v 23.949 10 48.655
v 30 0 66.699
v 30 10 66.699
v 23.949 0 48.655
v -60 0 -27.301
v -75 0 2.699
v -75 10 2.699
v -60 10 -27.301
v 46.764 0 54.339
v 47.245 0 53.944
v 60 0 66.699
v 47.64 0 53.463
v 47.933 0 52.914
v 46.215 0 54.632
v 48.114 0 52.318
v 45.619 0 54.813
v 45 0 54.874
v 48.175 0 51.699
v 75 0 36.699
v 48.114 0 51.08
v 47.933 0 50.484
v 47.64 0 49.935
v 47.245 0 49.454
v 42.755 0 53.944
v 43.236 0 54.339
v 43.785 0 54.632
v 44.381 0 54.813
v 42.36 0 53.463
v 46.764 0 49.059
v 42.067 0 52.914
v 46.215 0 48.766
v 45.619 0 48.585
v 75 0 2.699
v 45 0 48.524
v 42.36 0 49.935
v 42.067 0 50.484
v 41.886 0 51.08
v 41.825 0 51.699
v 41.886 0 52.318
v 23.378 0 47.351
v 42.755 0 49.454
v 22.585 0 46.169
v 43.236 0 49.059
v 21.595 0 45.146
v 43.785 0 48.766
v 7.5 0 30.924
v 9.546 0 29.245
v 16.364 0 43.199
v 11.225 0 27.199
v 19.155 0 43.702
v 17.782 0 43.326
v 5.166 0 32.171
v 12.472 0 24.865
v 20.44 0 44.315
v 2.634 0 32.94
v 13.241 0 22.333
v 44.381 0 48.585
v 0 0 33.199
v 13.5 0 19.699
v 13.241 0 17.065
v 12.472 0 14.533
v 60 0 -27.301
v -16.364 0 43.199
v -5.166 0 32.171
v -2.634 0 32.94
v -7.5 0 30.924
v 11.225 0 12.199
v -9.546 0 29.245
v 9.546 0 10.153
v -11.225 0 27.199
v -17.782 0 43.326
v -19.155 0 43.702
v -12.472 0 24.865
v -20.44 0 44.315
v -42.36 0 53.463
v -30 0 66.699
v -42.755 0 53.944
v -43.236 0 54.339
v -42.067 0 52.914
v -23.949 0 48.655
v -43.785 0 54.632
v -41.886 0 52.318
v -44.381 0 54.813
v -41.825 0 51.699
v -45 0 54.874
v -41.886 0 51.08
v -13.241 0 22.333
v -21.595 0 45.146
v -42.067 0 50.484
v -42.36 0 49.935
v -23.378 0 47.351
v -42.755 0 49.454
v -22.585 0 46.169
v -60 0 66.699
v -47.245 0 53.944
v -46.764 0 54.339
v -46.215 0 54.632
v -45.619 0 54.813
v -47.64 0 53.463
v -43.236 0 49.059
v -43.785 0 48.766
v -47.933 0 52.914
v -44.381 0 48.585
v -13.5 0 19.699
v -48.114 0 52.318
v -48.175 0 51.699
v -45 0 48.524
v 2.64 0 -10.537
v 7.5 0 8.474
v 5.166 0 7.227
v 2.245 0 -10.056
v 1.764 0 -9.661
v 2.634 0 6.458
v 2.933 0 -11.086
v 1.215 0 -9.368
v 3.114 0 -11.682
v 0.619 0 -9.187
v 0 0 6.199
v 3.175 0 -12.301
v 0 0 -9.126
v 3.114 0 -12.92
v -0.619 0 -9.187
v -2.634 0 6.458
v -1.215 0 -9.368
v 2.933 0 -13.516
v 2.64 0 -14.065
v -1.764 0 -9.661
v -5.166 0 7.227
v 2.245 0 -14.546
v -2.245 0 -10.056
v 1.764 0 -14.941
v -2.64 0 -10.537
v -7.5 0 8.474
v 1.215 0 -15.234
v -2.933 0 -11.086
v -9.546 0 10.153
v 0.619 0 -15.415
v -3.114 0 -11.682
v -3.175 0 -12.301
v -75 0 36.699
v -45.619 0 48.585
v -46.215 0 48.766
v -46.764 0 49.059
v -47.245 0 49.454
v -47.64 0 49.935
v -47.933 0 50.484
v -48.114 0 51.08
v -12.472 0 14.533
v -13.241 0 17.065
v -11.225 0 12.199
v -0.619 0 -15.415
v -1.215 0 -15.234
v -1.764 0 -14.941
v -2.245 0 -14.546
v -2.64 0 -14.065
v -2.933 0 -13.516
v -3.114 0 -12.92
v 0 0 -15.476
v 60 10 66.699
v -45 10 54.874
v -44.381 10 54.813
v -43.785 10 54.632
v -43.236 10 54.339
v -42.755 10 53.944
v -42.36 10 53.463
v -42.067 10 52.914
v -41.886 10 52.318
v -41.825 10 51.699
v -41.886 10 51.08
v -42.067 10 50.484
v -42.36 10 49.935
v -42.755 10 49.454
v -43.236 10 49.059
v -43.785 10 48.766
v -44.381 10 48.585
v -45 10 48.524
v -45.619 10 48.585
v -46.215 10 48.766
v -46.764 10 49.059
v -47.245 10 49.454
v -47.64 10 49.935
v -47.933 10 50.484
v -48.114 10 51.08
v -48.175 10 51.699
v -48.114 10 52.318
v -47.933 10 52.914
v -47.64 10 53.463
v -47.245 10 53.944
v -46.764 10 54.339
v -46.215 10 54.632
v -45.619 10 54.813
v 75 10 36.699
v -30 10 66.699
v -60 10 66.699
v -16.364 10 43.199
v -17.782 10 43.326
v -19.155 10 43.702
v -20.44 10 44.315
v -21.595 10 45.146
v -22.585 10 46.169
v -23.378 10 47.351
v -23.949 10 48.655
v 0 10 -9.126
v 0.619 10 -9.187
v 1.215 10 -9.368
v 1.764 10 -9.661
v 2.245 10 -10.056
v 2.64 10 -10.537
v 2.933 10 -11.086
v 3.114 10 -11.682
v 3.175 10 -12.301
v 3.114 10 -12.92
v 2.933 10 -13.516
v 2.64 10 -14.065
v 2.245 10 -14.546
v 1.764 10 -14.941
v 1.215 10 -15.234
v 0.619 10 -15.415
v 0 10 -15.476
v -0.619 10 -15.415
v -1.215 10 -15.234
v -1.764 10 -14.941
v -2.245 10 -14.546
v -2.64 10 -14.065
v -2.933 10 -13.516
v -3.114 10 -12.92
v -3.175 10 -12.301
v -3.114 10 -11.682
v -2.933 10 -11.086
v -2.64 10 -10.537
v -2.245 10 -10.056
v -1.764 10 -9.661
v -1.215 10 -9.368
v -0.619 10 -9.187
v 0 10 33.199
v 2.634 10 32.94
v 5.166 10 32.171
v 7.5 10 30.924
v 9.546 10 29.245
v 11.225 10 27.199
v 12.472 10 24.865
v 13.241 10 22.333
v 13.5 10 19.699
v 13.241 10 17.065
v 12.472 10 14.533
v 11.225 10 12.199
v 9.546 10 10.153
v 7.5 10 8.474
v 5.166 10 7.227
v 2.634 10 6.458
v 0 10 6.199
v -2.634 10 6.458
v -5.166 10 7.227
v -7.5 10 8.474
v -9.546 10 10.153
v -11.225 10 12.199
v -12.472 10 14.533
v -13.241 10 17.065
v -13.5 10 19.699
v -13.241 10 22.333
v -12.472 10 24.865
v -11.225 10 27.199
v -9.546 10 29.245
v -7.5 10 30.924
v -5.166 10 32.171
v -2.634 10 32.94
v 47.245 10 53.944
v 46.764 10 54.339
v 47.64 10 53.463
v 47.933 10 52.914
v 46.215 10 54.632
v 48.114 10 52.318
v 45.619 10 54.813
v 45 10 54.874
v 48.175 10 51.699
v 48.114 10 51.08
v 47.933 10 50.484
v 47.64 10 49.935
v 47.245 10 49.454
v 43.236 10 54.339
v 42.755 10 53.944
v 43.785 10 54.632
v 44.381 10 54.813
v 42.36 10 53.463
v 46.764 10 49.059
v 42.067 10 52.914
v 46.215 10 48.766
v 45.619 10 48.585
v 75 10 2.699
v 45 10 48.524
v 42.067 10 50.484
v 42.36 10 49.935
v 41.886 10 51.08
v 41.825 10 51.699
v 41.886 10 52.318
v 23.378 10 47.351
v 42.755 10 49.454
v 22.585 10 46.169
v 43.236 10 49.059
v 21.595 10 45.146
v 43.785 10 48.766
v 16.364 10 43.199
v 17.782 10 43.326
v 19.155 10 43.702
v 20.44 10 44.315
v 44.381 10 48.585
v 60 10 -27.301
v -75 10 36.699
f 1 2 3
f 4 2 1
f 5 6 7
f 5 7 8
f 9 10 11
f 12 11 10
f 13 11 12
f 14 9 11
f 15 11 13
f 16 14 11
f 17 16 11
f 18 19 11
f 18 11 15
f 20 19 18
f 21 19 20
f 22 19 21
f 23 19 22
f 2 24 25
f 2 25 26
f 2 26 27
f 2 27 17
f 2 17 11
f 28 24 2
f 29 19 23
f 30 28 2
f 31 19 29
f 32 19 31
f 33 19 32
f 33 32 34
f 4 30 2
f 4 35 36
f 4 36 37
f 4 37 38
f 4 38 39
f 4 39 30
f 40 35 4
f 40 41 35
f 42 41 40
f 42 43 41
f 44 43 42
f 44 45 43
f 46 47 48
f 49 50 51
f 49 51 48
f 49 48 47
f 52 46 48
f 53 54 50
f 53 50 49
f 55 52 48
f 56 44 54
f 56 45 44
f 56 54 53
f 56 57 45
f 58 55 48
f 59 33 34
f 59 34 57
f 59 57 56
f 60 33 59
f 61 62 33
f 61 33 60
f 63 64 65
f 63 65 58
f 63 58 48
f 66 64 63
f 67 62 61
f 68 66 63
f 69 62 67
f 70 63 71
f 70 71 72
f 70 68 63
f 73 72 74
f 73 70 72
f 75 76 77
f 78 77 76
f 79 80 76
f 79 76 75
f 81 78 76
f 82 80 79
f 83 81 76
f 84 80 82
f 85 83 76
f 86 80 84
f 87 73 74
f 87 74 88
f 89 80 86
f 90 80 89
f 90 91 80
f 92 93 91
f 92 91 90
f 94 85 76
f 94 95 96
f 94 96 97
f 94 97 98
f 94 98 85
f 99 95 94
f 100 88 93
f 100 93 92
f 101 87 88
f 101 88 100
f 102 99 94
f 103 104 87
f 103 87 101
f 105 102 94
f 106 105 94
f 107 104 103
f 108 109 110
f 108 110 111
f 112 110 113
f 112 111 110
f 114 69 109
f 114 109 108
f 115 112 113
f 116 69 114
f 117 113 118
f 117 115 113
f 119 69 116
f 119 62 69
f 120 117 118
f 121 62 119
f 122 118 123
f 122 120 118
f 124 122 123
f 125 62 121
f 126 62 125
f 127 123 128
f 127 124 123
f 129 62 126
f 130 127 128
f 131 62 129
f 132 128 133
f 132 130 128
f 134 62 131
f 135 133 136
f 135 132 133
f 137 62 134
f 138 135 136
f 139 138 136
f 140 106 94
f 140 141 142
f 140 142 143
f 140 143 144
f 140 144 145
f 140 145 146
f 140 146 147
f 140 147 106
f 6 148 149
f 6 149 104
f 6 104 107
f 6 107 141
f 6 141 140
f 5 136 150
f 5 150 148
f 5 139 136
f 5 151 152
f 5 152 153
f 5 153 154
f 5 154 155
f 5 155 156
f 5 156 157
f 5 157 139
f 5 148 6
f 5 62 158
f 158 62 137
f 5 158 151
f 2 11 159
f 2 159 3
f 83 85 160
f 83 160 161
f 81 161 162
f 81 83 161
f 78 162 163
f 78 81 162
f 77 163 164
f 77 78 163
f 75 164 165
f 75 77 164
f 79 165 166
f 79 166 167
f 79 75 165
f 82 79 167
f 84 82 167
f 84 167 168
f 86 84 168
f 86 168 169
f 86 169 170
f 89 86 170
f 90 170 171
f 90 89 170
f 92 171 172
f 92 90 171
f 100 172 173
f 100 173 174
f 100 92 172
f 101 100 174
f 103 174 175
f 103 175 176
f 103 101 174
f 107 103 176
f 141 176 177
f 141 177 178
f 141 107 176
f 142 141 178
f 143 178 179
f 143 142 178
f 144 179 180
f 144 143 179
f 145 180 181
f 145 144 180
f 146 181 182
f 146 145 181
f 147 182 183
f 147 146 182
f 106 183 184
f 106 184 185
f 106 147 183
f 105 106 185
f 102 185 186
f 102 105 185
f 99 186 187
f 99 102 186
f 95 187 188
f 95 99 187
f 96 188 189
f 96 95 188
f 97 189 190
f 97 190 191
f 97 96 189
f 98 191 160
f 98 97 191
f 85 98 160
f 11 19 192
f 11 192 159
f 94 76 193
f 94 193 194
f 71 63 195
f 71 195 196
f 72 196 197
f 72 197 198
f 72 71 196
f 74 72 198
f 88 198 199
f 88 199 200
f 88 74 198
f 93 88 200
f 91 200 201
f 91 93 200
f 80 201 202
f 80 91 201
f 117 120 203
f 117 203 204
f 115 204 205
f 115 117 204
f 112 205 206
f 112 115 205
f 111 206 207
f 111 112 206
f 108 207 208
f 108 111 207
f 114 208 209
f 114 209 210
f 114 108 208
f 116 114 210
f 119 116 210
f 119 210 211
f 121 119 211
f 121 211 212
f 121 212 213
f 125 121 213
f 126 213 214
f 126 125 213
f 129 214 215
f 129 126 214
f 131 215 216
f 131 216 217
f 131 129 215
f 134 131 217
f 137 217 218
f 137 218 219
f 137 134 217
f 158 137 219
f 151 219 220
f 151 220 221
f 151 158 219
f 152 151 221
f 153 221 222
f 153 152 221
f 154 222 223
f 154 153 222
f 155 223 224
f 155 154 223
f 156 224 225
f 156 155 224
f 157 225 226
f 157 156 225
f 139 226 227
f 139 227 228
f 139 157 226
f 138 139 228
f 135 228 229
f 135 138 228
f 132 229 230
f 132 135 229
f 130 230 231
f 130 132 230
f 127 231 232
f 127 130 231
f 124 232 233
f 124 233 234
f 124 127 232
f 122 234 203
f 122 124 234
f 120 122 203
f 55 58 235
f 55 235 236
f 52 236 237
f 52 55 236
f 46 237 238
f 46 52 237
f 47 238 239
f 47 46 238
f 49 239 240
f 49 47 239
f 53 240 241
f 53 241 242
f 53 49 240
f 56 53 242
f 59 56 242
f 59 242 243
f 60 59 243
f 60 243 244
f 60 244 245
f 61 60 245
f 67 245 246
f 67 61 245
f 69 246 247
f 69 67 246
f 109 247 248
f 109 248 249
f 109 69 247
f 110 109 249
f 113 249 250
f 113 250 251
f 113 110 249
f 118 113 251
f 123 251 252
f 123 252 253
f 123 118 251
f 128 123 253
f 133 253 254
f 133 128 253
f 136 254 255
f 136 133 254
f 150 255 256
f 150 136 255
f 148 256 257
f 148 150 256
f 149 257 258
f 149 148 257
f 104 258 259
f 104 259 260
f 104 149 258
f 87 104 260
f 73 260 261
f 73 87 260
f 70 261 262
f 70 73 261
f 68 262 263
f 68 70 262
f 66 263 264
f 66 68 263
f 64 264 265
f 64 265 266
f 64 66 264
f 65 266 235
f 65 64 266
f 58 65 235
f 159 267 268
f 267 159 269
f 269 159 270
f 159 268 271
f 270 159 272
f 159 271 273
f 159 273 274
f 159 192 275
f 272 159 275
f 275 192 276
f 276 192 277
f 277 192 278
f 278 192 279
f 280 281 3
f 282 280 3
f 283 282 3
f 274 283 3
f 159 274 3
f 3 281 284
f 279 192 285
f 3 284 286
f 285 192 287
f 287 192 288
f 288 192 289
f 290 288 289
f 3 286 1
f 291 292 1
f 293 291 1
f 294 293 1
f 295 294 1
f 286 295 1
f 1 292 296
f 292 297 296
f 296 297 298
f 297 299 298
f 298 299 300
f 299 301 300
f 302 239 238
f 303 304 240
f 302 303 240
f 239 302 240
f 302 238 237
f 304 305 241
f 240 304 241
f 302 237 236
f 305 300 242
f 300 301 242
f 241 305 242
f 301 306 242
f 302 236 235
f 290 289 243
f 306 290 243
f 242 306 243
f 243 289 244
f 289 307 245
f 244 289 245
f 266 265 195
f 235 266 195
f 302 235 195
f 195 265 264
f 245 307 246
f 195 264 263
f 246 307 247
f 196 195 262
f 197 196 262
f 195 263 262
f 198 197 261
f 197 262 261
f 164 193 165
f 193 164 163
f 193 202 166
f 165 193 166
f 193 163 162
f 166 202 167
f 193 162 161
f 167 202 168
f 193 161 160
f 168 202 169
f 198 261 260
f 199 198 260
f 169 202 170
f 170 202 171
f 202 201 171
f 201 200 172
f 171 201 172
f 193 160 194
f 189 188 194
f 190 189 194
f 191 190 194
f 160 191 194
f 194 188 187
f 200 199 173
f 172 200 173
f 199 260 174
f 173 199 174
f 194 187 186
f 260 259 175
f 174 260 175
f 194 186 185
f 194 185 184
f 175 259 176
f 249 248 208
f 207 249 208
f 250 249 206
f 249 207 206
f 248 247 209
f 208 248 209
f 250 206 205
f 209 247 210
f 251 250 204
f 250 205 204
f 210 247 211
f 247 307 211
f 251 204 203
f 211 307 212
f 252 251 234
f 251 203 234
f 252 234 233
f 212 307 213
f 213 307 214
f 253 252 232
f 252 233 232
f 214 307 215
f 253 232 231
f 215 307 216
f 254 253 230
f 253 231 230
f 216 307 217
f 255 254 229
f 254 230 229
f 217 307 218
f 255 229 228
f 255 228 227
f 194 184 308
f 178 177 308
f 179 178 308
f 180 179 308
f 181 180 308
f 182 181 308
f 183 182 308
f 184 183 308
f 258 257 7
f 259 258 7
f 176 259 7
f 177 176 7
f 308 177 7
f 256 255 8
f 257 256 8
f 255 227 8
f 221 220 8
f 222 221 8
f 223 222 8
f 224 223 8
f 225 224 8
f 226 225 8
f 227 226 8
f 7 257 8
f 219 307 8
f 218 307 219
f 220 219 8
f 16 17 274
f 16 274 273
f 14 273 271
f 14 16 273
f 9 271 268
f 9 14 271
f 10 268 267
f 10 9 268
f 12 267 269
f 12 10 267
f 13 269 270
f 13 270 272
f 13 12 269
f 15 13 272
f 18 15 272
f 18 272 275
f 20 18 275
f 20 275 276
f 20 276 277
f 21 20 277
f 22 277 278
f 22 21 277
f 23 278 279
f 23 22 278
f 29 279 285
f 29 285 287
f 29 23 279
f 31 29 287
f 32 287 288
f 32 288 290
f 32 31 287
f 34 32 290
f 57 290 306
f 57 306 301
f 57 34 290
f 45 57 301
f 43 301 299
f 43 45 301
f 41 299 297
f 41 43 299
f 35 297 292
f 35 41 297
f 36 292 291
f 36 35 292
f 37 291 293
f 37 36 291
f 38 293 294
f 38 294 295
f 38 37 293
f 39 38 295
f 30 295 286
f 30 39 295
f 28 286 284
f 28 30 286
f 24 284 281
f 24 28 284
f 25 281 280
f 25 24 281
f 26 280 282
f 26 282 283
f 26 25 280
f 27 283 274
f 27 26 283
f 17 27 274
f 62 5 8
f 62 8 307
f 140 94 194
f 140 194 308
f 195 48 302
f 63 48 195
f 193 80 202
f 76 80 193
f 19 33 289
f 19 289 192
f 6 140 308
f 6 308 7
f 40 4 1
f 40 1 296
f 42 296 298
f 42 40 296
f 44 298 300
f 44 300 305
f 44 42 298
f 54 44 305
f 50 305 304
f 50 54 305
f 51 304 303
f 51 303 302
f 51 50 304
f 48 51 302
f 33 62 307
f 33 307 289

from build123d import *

# Parameters (mm, degrees)
SKETCH1_R           = 3.175
SKETCH1_R_2         = 13.5
BOSS_EXTRUDE1_DEPTH = 10


with BuildPart() as part:
    # Sketch1 → Boss-Extrude1 (new body)
    with BuildSketch(Plane(origin=(0, 0, 0), x_dir=(1, 0, 0), z_dir=(0, 1, 0))):
        with BuildLine():
            Line((-60, 27.300970874), (60, 27.300970874))
            Line((60, 27.300970874), (75, -2.699029126))
            Line((75, -2.699029126), (75, -36.699029126))
            Line((75, -36.699029126), (60, -66.699029126))
            Line((60, -66.699029126), (30, -66.699029126))
            Line((30, -66.699029126), (23.949215607, -48.655488788))
            ThreePointArc((23.949215607, -48.655488788), (21.036148951, -44.704865488), (16.364335743, -43.199029126))
            Line((16.364335743, -43.199029126), (-16.364335743, -43.199029126))
            ThreePointArc((-16.364335743, -43.199029126), (-21.036148951, -44.704865488), (-23.949215607, -48.655488788))
            Line((-23.949215607, -48.655488788), (-30, -66.699029126))
            Line((-30, -66.699029126), (-60, -66.699029126))
            Line((-60, -66.699029126), (-75, -36.699029126))
            Line((-75, -36.699029126), (-75, -2.699029126))
            Line((-75, -2.699029126), (-60, 27.300970874))
        make_face()
        with Locations(Location((-45, -51.699029126, 0), (0, 0, 270))):
            Circle(SKETCH1_R, mode=Mode.SUBTRACT)
        with Locations(Location((0, 12.300970874, 0), (0, 0, 270))):
            Circle(SKETCH1_R, mode=Mode.SUBTRACT)
        with Locations(Location((45, -51.699029126, 0), (0, 0, 270))):
            Circle(SKETCH1_R, mode=Mode.SUBTRACT)
        with Locations(Location((0, -19.699029126, 0), (0, 0, 270))):
            Circle(SKETCH1_R_2, mode=Mode.SUBTRACT)
    extrude(amount=BOSS_EXTRUDE1_DEPTH)


solid = part.part
